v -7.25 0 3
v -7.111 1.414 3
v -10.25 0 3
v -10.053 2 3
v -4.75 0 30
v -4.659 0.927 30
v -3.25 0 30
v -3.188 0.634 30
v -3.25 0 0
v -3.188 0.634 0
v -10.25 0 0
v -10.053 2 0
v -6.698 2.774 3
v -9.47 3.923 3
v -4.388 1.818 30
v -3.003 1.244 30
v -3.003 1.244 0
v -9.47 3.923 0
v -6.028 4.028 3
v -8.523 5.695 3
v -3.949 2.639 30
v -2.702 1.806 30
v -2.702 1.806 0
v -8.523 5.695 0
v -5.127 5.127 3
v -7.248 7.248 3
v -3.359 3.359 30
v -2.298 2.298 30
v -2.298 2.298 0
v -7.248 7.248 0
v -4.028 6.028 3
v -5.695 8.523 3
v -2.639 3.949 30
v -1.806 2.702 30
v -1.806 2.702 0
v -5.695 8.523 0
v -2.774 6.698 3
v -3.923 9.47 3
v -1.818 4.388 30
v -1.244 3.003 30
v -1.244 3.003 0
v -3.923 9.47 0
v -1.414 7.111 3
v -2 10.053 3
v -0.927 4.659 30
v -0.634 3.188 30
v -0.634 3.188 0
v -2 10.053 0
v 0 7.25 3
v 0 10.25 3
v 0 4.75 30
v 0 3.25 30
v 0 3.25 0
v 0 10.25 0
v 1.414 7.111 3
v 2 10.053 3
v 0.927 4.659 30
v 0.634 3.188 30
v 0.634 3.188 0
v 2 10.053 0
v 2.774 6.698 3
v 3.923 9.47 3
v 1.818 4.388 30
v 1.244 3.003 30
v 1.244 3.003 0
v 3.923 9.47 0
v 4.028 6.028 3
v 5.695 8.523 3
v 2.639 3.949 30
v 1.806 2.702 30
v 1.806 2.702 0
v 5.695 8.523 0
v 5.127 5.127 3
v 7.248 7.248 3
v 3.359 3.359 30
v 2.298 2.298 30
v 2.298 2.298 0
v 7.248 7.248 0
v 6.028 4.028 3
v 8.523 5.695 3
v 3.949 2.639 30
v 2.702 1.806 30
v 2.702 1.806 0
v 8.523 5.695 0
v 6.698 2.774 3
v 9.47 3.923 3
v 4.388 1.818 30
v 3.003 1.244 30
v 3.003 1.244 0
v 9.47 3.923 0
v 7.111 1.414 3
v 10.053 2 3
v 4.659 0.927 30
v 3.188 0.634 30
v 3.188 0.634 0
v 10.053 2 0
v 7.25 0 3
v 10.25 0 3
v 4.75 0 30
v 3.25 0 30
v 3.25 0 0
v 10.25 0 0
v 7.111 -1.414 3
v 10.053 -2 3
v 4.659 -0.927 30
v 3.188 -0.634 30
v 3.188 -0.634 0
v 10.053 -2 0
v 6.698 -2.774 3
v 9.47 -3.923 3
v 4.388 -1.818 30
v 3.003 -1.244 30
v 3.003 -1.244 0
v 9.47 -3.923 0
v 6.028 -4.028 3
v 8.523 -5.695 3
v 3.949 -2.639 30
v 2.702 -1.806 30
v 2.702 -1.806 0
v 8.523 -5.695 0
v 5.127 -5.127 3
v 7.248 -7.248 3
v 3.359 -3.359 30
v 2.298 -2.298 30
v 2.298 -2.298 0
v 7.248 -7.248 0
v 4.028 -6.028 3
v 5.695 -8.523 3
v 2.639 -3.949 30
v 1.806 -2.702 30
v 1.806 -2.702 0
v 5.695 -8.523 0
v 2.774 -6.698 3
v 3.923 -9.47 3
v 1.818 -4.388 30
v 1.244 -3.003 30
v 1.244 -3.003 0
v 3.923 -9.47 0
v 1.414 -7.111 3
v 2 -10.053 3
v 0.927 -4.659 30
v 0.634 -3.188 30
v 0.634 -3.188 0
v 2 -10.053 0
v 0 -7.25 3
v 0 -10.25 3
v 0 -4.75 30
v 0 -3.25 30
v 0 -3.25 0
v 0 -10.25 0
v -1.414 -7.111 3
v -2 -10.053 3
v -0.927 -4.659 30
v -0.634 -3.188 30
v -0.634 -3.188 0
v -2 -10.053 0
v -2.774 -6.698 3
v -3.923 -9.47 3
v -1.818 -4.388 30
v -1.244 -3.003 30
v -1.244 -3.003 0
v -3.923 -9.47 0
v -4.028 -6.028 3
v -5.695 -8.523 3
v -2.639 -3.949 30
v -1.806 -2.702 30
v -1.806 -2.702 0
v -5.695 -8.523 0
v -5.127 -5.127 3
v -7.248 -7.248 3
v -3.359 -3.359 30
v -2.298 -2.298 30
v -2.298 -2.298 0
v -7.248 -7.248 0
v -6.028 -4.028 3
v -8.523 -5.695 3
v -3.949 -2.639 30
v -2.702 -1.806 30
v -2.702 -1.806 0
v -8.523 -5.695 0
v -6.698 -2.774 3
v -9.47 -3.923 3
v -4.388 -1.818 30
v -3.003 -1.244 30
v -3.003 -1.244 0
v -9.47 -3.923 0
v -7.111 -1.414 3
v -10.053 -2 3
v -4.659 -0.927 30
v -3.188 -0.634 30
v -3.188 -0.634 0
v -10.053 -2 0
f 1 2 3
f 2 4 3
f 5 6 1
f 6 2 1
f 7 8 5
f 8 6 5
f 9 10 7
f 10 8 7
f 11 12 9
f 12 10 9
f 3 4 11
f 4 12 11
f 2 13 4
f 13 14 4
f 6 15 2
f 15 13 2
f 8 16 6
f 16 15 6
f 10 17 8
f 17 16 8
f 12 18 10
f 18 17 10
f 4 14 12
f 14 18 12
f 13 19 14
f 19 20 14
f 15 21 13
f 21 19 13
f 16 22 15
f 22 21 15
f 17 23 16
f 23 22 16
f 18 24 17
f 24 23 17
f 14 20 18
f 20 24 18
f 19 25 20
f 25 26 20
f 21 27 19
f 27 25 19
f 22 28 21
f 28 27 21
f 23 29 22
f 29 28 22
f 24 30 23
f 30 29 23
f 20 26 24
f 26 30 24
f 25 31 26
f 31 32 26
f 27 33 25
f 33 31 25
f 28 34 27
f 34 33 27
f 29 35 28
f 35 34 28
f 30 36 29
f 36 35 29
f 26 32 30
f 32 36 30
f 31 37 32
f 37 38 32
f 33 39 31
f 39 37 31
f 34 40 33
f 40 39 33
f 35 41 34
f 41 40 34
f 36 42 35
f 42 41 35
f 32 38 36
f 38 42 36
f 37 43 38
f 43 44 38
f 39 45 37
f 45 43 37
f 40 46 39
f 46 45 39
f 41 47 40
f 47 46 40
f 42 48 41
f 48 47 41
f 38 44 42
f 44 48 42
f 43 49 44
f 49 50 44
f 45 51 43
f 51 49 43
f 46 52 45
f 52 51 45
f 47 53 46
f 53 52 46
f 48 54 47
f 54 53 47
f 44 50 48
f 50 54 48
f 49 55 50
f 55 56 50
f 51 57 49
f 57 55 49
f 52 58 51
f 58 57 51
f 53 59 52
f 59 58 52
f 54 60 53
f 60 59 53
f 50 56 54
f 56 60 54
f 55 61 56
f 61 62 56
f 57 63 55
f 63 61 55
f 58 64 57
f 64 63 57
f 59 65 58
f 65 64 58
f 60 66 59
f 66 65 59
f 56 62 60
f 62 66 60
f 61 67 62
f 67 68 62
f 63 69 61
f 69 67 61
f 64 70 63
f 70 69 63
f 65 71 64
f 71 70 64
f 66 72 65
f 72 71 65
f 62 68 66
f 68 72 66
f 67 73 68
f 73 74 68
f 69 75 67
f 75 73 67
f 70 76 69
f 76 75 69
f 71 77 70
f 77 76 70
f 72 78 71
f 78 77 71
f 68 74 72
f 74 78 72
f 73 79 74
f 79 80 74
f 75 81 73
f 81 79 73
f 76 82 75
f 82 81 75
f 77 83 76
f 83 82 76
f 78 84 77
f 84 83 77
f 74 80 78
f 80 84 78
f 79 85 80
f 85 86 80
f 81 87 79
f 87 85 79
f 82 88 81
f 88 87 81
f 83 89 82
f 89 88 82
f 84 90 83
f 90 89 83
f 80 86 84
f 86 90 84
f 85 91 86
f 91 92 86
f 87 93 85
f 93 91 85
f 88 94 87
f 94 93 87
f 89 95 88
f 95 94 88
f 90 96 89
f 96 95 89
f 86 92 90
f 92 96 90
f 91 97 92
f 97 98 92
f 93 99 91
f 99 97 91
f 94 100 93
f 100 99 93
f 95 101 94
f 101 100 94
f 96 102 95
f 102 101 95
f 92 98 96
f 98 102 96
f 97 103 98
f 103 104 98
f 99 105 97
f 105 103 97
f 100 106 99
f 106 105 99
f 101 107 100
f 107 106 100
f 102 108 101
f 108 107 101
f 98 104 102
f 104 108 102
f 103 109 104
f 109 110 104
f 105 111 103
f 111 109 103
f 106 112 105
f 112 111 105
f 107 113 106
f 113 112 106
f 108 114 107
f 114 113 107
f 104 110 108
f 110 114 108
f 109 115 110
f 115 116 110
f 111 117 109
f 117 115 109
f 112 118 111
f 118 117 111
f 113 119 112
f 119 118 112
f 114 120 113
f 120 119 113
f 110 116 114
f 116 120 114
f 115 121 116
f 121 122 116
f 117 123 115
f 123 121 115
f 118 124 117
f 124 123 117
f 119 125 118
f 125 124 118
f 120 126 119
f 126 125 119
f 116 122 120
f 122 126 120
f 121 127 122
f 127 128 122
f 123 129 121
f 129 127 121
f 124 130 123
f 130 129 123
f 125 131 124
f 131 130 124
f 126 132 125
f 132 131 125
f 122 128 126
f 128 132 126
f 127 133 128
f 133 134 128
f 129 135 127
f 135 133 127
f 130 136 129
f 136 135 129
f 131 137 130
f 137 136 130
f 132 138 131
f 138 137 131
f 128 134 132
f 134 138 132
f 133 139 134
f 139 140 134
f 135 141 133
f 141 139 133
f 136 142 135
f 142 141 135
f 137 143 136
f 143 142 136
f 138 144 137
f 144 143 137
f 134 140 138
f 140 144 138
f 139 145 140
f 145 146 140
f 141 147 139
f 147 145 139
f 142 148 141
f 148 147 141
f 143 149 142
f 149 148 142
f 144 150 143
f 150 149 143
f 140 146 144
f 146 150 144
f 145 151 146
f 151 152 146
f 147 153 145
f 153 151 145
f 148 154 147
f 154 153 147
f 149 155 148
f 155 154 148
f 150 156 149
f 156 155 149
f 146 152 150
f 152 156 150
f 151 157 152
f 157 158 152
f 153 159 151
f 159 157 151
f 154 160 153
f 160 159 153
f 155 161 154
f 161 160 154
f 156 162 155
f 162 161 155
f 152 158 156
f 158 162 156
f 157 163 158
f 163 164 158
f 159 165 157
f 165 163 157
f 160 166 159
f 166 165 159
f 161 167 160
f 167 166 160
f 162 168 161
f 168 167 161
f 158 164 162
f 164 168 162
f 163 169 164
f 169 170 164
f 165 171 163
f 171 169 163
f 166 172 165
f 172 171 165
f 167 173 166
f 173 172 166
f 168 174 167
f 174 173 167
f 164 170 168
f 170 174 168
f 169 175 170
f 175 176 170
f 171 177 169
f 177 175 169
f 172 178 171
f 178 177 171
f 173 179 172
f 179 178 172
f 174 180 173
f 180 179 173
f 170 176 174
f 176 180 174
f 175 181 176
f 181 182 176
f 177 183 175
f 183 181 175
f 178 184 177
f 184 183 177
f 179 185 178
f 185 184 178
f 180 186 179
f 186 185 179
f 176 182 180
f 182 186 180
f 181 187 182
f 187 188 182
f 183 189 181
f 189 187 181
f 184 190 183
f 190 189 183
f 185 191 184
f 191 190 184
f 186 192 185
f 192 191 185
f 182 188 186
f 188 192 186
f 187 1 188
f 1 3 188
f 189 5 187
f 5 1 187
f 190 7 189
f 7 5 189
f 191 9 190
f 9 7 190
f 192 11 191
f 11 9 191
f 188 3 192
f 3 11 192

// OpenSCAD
$fn = 32;

// ----------------------------------------------------------------------
// Profiled standoff: conical spacer, 30 mm long, bore 6.5 mm
// ----------------------------------------------------------------------

// --- parameters (mm) ---
revolve_angle = 360;      // full turn around the Z axis
profile_points = 6;       // points of the closed outline

profile = [[3.25, 0], [10.25, 0], [10.25, 3], [7.25, 3], [4.75, 30], [3.25, 30]];  // single closed polygon, 6 points, counter clockwise

// --- the one profile operation ---
rotate_extrude(angle = revolve_angle) polygon(points = profile);
